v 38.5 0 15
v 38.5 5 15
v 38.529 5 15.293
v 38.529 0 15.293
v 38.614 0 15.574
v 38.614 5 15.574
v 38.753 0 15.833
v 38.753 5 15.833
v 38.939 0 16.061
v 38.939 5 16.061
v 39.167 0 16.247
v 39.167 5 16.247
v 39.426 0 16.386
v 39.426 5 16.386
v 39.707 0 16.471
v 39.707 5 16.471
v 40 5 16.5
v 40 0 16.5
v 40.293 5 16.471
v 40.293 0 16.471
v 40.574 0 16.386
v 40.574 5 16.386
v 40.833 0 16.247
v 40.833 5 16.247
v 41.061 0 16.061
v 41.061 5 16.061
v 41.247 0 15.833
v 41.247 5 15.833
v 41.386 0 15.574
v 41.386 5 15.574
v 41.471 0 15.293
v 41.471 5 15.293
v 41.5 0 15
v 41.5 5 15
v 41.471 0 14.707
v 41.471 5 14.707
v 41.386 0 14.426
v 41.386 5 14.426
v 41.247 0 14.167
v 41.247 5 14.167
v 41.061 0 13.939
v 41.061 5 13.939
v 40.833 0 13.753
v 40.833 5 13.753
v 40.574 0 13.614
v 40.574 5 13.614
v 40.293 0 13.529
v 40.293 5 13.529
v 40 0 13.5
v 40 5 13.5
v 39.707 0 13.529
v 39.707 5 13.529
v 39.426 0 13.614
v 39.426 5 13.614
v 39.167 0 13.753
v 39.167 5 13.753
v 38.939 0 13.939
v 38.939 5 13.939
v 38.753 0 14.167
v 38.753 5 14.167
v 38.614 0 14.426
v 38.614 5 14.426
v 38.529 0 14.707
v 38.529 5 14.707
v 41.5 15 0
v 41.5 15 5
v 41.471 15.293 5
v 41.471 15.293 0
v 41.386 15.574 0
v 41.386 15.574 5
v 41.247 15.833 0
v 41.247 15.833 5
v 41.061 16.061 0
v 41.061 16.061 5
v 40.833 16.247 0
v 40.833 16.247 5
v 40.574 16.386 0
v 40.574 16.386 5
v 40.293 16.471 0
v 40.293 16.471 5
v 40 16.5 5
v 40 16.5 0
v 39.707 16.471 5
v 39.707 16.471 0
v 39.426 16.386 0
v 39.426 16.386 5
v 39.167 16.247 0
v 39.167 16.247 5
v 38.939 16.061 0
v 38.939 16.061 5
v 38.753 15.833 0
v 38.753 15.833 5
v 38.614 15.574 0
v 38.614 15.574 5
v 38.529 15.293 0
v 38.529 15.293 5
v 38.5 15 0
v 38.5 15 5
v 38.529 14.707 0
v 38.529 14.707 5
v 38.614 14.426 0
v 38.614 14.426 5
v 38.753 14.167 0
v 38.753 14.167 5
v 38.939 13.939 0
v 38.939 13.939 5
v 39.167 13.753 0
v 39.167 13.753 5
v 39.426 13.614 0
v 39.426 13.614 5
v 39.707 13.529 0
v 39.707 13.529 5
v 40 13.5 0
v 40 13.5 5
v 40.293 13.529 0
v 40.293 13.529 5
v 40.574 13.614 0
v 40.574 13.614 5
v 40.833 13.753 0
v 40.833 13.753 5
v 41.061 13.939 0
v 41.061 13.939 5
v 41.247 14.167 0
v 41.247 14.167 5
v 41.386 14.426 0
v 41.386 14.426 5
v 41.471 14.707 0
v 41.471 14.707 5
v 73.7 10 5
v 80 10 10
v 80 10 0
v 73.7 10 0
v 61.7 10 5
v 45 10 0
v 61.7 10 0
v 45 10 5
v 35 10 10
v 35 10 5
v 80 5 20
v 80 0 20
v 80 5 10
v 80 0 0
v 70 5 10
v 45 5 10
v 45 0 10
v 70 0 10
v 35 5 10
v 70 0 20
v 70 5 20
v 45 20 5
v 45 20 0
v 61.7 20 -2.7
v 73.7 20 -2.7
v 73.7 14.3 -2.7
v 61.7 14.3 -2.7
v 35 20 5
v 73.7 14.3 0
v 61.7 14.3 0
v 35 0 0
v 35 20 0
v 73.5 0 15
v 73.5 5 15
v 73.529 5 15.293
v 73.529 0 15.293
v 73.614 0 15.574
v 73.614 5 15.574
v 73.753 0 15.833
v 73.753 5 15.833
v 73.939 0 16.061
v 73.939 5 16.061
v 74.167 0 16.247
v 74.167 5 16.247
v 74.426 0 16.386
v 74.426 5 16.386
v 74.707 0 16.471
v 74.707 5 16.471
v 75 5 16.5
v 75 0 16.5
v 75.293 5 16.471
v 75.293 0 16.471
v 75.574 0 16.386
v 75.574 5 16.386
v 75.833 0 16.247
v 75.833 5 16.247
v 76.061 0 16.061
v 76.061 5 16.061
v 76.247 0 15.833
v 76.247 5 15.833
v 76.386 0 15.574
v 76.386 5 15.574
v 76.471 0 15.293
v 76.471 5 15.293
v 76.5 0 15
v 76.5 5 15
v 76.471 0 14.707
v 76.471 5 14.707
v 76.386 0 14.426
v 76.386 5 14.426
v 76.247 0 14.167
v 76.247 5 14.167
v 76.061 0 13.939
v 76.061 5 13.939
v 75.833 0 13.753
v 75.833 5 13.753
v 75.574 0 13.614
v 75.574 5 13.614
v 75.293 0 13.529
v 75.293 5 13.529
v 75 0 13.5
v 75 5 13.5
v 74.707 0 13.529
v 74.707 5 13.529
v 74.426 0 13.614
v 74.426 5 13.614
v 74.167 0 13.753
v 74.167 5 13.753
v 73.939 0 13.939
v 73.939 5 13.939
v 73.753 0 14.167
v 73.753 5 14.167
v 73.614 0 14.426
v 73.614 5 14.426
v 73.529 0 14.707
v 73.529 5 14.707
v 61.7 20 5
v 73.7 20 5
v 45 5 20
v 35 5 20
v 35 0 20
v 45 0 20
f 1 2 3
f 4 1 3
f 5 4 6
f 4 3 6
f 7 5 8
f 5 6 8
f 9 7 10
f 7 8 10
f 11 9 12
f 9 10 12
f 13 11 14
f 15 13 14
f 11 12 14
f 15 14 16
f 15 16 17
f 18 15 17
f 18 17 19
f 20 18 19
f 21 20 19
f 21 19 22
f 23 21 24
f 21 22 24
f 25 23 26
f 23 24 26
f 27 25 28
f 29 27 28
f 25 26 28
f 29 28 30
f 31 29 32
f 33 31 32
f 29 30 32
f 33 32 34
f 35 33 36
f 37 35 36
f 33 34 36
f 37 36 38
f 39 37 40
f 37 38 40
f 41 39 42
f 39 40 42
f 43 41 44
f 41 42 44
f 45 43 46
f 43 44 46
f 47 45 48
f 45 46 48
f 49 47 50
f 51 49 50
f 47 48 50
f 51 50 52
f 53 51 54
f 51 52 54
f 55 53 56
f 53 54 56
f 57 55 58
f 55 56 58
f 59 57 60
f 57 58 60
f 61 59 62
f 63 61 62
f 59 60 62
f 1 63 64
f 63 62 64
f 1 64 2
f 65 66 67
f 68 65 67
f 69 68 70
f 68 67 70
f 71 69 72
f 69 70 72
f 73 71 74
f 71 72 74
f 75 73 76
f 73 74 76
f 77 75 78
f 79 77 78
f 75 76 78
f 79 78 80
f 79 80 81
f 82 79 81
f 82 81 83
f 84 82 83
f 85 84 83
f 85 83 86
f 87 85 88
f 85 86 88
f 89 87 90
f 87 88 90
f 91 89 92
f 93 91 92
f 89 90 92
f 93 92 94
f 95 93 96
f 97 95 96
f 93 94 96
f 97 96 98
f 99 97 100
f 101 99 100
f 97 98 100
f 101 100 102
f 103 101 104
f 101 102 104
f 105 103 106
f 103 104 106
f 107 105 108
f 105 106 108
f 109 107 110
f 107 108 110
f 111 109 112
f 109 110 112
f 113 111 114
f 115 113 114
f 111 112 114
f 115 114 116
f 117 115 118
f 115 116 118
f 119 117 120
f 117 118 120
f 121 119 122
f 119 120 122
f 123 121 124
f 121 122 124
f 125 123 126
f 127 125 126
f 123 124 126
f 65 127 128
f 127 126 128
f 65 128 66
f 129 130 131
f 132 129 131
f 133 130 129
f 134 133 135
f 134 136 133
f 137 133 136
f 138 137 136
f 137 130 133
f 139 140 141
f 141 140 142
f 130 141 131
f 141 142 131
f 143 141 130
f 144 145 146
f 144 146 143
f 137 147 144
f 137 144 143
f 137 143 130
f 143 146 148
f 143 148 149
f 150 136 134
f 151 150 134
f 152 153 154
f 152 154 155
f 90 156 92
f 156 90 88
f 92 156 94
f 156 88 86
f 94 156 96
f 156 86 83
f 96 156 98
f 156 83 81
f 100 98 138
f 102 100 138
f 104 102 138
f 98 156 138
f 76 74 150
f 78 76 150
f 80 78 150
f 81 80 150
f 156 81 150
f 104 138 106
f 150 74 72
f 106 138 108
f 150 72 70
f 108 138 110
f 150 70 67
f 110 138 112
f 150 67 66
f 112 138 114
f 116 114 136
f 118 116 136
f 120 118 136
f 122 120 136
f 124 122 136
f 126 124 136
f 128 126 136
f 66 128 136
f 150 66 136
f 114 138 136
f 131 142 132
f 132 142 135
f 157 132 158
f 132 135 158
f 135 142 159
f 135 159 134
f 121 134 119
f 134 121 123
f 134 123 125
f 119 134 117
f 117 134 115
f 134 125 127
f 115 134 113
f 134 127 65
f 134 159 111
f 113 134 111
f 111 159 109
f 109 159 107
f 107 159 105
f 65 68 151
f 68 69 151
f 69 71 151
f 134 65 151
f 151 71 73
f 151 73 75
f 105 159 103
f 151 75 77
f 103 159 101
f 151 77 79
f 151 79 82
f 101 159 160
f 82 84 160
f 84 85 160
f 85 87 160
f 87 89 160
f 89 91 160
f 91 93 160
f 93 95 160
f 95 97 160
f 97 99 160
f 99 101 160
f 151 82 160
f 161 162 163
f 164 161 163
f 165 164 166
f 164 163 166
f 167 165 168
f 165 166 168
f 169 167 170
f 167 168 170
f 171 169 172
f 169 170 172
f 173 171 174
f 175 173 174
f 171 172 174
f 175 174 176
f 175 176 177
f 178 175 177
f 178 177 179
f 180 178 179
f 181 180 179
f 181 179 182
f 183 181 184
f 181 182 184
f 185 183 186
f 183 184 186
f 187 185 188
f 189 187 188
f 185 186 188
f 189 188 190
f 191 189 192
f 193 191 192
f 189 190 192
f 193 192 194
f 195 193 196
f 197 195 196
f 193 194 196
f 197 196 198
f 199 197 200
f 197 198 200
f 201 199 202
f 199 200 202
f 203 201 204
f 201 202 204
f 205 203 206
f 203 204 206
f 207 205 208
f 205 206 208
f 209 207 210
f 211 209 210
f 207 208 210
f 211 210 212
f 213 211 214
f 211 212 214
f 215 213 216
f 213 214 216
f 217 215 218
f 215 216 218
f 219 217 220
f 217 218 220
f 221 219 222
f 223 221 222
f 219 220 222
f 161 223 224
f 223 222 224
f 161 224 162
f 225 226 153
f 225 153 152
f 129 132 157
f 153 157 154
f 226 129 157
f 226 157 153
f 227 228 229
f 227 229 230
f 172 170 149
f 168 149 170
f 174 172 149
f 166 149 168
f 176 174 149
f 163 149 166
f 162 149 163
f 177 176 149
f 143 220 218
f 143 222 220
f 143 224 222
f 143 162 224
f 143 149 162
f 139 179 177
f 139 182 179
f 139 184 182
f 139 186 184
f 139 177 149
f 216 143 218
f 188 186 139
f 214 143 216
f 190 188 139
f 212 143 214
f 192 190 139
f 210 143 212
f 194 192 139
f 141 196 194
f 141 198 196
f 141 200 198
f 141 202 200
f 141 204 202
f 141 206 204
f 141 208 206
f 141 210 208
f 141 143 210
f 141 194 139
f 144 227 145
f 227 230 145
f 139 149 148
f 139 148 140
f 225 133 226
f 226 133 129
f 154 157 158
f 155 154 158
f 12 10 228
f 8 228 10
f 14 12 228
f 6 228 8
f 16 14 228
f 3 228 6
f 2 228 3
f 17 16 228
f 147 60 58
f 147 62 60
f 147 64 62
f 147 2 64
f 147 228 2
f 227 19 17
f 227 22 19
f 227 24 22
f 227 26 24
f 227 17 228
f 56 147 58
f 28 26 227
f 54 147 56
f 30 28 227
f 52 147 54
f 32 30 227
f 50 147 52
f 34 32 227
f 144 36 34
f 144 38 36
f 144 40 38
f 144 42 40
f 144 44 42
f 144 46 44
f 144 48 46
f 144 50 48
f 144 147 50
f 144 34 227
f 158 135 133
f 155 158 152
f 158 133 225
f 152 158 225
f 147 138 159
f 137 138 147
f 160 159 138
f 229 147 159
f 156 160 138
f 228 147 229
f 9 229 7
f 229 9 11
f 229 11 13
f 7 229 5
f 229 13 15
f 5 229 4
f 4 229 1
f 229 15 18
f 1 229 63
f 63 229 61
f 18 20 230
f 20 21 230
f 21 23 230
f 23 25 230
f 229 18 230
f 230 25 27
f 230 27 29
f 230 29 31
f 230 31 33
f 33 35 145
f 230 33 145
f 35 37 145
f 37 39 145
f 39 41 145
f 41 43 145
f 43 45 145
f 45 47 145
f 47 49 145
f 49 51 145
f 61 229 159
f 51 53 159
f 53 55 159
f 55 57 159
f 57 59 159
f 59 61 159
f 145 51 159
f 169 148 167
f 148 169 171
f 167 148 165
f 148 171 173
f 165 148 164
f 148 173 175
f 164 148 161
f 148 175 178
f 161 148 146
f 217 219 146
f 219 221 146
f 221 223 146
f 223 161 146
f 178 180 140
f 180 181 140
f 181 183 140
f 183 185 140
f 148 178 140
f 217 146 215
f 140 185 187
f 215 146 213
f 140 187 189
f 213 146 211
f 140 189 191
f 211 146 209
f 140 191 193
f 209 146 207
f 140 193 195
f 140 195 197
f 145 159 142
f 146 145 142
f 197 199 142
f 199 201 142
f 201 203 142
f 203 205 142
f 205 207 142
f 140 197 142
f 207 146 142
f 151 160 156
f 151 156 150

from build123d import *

# Parameters (mm, degrees)
SKETCH1_W           = 45
SKETCH1_H           = 10
BOSS_EXTRUDE1_DEPTH = 10
SKETCH2_W           = 10
SKETCH2_H           = 5
SKETCH2_W_2         = 12
BOSS_EXTRUDE2_DEPTH = 10
SKETCH3_W           = 10
SKETCH3_H           = 5
BOSS_EXTRUDE3_DEPTH = 10
SKETCH4_R           = 1.5
CUT_EXTRUDE1_DEPTH  = 5
SKETCH9_R           = 1.5
CUT_EXTRUDE6_DEPTH  = 5
SKETCH10_R          = 1.5
CUT_EXTRUDE7_DEPTH  = 5
SKETCH11_W          = 12
SKETCH11_H          = 5.7
BOSS_EXTRUDE4_DEPTH = 2.7
SKETCH7_W           = 10
SKETCH7_H           = 10
BOSS_EXTRUDE5_DEPTH = 35
SKETCH13_W          = 12
SKETCH13_H          = 5
BOSS_EXTRUDE6_DEPTH = 10
SKETCH14_W          = 12
SKETCH14_H          = 5.7
BOSS_EXTRUDE7_DEPTH = 2.7
SKETCH15_W          = 5
SKETCH15_H          = 10
CUT_EXTRUDE9_DEPTH  = 50
SKETCH16_W          = 10
SKETCH16_H          = 5
BOSS_EXTRUDE8_DEPTH = 10
SKETCH17_R          = 1.5
CUT_EXTRUDE10_DEPTH = 5


with BuildPart() as part:
    # Sketch1 → Boss-Extrude1 (new body)
    with BuildSketch(Plane.XY):
        with Locations((22.5, 5)):
            Rectangle(SKETCH1_W, SKETCH1_H)
    extrude(amount=BOSS_EXTRUDE1_DEPTH)

    # Sketch2 → Boss-Extrude2 (add)
    with BuildSketch(Plane(origin=(0, 10, 0), x_dir=(1, 0, 0), z_dir=(0, 1, 0))):
        with Locations((40, -2.5)):
            Rectangle(SKETCH2_W, SKETCH2_H)
        with Locations((12.3, -2.5)):
            Rectangle(SKETCH2_W_2, SKETCH2_H)
    extrude(amount=BOSS_EXTRUDE2_DEPTH)

    # Sketch3 → Boss-Extrude3 (add)
    with BuildSketch(Plane.XY.offset(10)):
        with Locations((5, 2.5)):
            Rectangle(SKETCH3_W, SKETCH3_H)
        with Locations((40, 2.5)):
            Rectangle(SKETCH3_W, SKETCH3_H)
    extrude(amount=BOSS_EXTRUDE3_DEPTH)

    # Sketch4 → Cut-Extrude1 (cut)
    with BuildSketch(Plane.ZY):
        with Locations((5, 5)):
            Circle(SKETCH4_R)
    extrude(amount=-CUT_EXTRUDE1_DEPTH, mode=Mode.SUBTRACT)

    # Sketch9 → Cut-Extrude6 (cut)
    with BuildSketch(Plane(origin=(0, 5, 0), x_dir=(1, 0, 0), z_dir=(0, 1, 0))):
        with Locations(Location((40, -15, 0), (0, 0, 180))):
            Circle(SKETCH9_R)
    extrude(amount=-CUT_EXTRUDE6_DEPTH, mode=Mode.SUBTRACT)

    # Sketch10 → Cut-Extrude7 (cut)
    with BuildSketch(Plane.XY.offset(5)):
        with Locations((40, 15)):
            Circle(SKETCH10_R)
    extrude(amount=-CUT_EXTRUDE7_DEPTH, mode=Mode.SUBTRACT)

    # Sketch11 → Boss-Extrude4 (add)
    with BuildSketch(Plane(origin=(0, 0, 0), x_dir=(-1, 0, 0), z_dir=(0, 0, -1))):
        with Locations((-12.3, 17.15)):
            Rectangle(SKETCH11_W, SKETCH11_H)
    extrude(amount=BOSS_EXTRUDE4_DEPTH)

    # Sketch7 → Boss-Extrude5 (add)
    with BuildSketch(Plane(origin=(45, 0, 0), x_dir=(0, 0, -1), z_dir=(1, 0, 0))):
        with Locations((-5, 5)):
            Rectangle(SKETCH7_W, SKETCH7_H)
    extrude(amount=BOSS_EXTRUDE5_DEPTH)

    # Sketch13 → Boss-Extrude6 (add)
    with BuildSketch(Plane(origin=(0, 10, 0), x_dir=(1, 0, 0), z_dir=(0, 1, 0))):
        with Locations((67.7, -2.5)):
            Rectangle(SKETCH13_W, SKETCH13_H)
    extrude(amount=BOSS_EXTRUDE6_DEPTH)

    # Sketch14 → Boss-Extrude7 (add)
    with BuildSketch(Plane(origin=(0, 0, 0), x_dir=(-1, 0, 0), z_dir=(0, 0, -1))):
        with Locations((-67.7, 17.15)):
            Rectangle(SKETCH14_W, SKETCH14_H)
    extrude(amount=BOSS_EXTRUDE7_DEPTH)

    # Sketch15 → Cut-Extrude9 (cut)
    with BuildSketch(Plane.ZY.offset(-35)):
        Polygon((20, 20), (5, 20), (5, 10), (0, 10), (0, 0), (20, 0), align=None)
        with Locations((2.5, 15)):
            Rectangle(SKETCH15_W, SKETCH15_H)
        Polygon((0, 10), (0, 20), (-5, 20), (-5, 0), (0, 0), align=None)
    extrude(amount=CUT_EXTRUDE9_DEPTH, mode=Mode.SUBTRACT)

    # Sketch16 → Boss-Extrude8 (add)
    with BuildSketch(Plane.XY.offset(10)):
        with Locations((75, 2.5)):
            Rectangle(SKETCH16_W, SKETCH16_H)
    extrude(amount=BOSS_EXTRUDE8_DEPTH)

    # Sketch17 → Cut-Extrude10 (cut)
    with BuildSketch(Plane(origin=(0, 5, 0), x_dir=(1, 0, 0), z_dir=(0, 1, 0))):
        with Locations(Location((75, -15, 0), (0, 0, 180))):
            Circle(SKETCH17_R)
    extrude(amount=-CUT_EXTRUDE10_DEPTH, mode=Mode.SUBTRACT)


solid = part.part
